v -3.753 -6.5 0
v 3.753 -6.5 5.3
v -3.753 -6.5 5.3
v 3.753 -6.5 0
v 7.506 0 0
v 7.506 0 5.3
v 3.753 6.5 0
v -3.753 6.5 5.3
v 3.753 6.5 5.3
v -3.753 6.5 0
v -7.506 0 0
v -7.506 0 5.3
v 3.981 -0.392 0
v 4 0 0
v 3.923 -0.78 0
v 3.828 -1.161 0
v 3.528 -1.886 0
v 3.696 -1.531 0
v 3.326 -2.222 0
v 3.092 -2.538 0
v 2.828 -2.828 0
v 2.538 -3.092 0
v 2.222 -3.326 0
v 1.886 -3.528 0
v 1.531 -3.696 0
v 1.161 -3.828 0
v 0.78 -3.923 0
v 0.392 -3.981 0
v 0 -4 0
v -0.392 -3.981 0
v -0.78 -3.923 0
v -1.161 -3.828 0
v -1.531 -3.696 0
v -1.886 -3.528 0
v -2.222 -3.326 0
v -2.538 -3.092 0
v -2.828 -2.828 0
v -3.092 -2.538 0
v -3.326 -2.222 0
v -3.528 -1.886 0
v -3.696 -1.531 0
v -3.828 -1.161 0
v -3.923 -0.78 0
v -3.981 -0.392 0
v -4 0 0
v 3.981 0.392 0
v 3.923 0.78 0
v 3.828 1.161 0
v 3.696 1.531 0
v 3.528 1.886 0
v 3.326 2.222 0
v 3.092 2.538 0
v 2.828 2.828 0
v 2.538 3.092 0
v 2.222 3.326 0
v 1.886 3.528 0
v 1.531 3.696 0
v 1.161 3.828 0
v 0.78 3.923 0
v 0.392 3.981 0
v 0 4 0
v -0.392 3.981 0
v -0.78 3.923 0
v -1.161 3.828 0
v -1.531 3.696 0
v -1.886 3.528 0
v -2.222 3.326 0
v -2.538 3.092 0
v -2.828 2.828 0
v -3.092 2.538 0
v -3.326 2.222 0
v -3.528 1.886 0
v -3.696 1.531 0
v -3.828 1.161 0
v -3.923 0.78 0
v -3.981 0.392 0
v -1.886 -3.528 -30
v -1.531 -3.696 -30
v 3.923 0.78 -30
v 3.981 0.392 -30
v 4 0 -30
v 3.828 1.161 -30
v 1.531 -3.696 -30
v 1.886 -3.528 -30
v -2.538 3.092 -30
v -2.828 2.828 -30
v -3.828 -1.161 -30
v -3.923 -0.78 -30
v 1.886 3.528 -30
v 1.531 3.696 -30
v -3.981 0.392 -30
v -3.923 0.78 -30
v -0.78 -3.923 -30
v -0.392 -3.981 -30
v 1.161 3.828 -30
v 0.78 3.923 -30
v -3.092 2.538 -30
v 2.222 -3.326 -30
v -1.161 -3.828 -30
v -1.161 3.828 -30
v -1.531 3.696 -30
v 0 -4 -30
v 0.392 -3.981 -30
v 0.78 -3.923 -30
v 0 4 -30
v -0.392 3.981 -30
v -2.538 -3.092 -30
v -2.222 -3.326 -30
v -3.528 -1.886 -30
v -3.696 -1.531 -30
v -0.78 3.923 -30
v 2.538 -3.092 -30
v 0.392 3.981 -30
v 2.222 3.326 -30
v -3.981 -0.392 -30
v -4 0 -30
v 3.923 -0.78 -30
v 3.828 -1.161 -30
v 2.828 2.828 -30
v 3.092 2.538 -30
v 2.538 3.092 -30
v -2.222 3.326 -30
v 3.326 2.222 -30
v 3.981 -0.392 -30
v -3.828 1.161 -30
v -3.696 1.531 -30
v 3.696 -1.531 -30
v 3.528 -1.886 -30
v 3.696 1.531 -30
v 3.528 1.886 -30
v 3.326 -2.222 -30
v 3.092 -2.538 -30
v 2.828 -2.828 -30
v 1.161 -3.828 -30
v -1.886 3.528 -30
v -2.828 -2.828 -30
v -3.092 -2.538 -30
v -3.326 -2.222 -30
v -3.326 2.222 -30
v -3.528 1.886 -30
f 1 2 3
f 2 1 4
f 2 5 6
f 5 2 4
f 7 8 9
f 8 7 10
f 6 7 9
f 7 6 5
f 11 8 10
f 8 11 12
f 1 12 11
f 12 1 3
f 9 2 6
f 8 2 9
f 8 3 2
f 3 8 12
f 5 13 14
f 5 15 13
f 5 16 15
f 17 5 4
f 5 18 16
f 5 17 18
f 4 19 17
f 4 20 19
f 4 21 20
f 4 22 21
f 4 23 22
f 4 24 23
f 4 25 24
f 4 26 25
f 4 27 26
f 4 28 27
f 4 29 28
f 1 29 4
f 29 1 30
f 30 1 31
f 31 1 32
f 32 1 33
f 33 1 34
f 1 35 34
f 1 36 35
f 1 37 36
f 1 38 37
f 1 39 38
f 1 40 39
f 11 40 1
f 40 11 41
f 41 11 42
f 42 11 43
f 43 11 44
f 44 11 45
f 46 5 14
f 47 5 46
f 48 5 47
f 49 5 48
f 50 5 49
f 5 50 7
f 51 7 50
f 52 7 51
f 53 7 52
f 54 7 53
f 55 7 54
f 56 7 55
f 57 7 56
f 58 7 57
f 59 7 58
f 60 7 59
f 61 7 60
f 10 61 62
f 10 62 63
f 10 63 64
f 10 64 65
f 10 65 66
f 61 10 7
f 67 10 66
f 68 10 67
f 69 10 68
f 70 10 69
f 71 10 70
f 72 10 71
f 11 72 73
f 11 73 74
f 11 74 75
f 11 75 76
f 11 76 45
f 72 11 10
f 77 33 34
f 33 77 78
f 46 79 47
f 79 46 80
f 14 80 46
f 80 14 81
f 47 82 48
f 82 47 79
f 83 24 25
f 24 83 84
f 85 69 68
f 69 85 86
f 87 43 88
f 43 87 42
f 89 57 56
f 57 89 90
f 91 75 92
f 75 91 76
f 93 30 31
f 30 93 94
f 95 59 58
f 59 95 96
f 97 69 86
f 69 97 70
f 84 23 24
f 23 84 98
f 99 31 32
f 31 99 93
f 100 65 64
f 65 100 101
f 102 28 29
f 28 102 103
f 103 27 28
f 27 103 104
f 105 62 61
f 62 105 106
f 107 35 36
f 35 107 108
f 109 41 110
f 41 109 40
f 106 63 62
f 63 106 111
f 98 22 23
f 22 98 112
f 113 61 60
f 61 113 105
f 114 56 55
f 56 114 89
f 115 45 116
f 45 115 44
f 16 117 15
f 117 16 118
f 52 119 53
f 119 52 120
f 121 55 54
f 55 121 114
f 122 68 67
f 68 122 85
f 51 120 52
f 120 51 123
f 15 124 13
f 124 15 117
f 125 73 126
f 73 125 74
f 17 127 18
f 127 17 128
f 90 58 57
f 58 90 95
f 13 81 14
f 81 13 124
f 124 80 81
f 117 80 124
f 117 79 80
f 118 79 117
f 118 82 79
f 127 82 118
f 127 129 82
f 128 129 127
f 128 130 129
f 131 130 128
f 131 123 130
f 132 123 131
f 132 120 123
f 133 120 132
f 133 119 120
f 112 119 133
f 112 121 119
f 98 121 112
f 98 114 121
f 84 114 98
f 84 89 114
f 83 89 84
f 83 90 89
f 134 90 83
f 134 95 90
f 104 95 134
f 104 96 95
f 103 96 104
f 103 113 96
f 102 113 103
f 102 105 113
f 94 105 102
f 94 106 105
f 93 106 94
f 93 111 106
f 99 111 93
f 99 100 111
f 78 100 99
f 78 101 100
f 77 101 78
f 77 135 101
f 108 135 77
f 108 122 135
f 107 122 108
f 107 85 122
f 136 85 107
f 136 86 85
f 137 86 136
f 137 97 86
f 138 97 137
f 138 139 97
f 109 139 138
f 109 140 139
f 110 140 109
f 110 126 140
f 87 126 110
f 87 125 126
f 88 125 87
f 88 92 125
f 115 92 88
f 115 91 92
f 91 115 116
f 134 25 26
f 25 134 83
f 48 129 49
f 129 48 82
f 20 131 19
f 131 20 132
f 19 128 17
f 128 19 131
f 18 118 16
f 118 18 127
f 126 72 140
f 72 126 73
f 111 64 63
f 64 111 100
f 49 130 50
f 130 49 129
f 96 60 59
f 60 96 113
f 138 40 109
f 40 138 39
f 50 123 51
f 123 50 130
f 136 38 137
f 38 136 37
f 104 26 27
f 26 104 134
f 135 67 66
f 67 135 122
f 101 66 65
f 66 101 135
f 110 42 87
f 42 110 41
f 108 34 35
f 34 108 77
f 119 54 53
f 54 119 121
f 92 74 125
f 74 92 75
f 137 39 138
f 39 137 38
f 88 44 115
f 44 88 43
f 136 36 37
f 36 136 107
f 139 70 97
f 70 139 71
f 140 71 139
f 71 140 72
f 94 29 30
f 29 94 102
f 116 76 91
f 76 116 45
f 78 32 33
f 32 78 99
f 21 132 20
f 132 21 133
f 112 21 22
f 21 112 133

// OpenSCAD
// M8 六角ボルト

// 頭部寸法
head_across_flats = 13;
head_height = 5.3;

// シャンク寸法
shank_diameter = 8;
shank_length = 30;

// 対辺距離から外接円半径を計算
head_radius = head_across_flats / 2 / cos(30);

// 頭部(六角柱)
translate([0, 0, 0])
    cylinder(h = head_height, r = head_radius, $fn = 6);

// シャンク(円柱)
translate([0, 0, -shank_length])
    cylinder(h = shank_length, d = shank_diameter, $fn = 64);
